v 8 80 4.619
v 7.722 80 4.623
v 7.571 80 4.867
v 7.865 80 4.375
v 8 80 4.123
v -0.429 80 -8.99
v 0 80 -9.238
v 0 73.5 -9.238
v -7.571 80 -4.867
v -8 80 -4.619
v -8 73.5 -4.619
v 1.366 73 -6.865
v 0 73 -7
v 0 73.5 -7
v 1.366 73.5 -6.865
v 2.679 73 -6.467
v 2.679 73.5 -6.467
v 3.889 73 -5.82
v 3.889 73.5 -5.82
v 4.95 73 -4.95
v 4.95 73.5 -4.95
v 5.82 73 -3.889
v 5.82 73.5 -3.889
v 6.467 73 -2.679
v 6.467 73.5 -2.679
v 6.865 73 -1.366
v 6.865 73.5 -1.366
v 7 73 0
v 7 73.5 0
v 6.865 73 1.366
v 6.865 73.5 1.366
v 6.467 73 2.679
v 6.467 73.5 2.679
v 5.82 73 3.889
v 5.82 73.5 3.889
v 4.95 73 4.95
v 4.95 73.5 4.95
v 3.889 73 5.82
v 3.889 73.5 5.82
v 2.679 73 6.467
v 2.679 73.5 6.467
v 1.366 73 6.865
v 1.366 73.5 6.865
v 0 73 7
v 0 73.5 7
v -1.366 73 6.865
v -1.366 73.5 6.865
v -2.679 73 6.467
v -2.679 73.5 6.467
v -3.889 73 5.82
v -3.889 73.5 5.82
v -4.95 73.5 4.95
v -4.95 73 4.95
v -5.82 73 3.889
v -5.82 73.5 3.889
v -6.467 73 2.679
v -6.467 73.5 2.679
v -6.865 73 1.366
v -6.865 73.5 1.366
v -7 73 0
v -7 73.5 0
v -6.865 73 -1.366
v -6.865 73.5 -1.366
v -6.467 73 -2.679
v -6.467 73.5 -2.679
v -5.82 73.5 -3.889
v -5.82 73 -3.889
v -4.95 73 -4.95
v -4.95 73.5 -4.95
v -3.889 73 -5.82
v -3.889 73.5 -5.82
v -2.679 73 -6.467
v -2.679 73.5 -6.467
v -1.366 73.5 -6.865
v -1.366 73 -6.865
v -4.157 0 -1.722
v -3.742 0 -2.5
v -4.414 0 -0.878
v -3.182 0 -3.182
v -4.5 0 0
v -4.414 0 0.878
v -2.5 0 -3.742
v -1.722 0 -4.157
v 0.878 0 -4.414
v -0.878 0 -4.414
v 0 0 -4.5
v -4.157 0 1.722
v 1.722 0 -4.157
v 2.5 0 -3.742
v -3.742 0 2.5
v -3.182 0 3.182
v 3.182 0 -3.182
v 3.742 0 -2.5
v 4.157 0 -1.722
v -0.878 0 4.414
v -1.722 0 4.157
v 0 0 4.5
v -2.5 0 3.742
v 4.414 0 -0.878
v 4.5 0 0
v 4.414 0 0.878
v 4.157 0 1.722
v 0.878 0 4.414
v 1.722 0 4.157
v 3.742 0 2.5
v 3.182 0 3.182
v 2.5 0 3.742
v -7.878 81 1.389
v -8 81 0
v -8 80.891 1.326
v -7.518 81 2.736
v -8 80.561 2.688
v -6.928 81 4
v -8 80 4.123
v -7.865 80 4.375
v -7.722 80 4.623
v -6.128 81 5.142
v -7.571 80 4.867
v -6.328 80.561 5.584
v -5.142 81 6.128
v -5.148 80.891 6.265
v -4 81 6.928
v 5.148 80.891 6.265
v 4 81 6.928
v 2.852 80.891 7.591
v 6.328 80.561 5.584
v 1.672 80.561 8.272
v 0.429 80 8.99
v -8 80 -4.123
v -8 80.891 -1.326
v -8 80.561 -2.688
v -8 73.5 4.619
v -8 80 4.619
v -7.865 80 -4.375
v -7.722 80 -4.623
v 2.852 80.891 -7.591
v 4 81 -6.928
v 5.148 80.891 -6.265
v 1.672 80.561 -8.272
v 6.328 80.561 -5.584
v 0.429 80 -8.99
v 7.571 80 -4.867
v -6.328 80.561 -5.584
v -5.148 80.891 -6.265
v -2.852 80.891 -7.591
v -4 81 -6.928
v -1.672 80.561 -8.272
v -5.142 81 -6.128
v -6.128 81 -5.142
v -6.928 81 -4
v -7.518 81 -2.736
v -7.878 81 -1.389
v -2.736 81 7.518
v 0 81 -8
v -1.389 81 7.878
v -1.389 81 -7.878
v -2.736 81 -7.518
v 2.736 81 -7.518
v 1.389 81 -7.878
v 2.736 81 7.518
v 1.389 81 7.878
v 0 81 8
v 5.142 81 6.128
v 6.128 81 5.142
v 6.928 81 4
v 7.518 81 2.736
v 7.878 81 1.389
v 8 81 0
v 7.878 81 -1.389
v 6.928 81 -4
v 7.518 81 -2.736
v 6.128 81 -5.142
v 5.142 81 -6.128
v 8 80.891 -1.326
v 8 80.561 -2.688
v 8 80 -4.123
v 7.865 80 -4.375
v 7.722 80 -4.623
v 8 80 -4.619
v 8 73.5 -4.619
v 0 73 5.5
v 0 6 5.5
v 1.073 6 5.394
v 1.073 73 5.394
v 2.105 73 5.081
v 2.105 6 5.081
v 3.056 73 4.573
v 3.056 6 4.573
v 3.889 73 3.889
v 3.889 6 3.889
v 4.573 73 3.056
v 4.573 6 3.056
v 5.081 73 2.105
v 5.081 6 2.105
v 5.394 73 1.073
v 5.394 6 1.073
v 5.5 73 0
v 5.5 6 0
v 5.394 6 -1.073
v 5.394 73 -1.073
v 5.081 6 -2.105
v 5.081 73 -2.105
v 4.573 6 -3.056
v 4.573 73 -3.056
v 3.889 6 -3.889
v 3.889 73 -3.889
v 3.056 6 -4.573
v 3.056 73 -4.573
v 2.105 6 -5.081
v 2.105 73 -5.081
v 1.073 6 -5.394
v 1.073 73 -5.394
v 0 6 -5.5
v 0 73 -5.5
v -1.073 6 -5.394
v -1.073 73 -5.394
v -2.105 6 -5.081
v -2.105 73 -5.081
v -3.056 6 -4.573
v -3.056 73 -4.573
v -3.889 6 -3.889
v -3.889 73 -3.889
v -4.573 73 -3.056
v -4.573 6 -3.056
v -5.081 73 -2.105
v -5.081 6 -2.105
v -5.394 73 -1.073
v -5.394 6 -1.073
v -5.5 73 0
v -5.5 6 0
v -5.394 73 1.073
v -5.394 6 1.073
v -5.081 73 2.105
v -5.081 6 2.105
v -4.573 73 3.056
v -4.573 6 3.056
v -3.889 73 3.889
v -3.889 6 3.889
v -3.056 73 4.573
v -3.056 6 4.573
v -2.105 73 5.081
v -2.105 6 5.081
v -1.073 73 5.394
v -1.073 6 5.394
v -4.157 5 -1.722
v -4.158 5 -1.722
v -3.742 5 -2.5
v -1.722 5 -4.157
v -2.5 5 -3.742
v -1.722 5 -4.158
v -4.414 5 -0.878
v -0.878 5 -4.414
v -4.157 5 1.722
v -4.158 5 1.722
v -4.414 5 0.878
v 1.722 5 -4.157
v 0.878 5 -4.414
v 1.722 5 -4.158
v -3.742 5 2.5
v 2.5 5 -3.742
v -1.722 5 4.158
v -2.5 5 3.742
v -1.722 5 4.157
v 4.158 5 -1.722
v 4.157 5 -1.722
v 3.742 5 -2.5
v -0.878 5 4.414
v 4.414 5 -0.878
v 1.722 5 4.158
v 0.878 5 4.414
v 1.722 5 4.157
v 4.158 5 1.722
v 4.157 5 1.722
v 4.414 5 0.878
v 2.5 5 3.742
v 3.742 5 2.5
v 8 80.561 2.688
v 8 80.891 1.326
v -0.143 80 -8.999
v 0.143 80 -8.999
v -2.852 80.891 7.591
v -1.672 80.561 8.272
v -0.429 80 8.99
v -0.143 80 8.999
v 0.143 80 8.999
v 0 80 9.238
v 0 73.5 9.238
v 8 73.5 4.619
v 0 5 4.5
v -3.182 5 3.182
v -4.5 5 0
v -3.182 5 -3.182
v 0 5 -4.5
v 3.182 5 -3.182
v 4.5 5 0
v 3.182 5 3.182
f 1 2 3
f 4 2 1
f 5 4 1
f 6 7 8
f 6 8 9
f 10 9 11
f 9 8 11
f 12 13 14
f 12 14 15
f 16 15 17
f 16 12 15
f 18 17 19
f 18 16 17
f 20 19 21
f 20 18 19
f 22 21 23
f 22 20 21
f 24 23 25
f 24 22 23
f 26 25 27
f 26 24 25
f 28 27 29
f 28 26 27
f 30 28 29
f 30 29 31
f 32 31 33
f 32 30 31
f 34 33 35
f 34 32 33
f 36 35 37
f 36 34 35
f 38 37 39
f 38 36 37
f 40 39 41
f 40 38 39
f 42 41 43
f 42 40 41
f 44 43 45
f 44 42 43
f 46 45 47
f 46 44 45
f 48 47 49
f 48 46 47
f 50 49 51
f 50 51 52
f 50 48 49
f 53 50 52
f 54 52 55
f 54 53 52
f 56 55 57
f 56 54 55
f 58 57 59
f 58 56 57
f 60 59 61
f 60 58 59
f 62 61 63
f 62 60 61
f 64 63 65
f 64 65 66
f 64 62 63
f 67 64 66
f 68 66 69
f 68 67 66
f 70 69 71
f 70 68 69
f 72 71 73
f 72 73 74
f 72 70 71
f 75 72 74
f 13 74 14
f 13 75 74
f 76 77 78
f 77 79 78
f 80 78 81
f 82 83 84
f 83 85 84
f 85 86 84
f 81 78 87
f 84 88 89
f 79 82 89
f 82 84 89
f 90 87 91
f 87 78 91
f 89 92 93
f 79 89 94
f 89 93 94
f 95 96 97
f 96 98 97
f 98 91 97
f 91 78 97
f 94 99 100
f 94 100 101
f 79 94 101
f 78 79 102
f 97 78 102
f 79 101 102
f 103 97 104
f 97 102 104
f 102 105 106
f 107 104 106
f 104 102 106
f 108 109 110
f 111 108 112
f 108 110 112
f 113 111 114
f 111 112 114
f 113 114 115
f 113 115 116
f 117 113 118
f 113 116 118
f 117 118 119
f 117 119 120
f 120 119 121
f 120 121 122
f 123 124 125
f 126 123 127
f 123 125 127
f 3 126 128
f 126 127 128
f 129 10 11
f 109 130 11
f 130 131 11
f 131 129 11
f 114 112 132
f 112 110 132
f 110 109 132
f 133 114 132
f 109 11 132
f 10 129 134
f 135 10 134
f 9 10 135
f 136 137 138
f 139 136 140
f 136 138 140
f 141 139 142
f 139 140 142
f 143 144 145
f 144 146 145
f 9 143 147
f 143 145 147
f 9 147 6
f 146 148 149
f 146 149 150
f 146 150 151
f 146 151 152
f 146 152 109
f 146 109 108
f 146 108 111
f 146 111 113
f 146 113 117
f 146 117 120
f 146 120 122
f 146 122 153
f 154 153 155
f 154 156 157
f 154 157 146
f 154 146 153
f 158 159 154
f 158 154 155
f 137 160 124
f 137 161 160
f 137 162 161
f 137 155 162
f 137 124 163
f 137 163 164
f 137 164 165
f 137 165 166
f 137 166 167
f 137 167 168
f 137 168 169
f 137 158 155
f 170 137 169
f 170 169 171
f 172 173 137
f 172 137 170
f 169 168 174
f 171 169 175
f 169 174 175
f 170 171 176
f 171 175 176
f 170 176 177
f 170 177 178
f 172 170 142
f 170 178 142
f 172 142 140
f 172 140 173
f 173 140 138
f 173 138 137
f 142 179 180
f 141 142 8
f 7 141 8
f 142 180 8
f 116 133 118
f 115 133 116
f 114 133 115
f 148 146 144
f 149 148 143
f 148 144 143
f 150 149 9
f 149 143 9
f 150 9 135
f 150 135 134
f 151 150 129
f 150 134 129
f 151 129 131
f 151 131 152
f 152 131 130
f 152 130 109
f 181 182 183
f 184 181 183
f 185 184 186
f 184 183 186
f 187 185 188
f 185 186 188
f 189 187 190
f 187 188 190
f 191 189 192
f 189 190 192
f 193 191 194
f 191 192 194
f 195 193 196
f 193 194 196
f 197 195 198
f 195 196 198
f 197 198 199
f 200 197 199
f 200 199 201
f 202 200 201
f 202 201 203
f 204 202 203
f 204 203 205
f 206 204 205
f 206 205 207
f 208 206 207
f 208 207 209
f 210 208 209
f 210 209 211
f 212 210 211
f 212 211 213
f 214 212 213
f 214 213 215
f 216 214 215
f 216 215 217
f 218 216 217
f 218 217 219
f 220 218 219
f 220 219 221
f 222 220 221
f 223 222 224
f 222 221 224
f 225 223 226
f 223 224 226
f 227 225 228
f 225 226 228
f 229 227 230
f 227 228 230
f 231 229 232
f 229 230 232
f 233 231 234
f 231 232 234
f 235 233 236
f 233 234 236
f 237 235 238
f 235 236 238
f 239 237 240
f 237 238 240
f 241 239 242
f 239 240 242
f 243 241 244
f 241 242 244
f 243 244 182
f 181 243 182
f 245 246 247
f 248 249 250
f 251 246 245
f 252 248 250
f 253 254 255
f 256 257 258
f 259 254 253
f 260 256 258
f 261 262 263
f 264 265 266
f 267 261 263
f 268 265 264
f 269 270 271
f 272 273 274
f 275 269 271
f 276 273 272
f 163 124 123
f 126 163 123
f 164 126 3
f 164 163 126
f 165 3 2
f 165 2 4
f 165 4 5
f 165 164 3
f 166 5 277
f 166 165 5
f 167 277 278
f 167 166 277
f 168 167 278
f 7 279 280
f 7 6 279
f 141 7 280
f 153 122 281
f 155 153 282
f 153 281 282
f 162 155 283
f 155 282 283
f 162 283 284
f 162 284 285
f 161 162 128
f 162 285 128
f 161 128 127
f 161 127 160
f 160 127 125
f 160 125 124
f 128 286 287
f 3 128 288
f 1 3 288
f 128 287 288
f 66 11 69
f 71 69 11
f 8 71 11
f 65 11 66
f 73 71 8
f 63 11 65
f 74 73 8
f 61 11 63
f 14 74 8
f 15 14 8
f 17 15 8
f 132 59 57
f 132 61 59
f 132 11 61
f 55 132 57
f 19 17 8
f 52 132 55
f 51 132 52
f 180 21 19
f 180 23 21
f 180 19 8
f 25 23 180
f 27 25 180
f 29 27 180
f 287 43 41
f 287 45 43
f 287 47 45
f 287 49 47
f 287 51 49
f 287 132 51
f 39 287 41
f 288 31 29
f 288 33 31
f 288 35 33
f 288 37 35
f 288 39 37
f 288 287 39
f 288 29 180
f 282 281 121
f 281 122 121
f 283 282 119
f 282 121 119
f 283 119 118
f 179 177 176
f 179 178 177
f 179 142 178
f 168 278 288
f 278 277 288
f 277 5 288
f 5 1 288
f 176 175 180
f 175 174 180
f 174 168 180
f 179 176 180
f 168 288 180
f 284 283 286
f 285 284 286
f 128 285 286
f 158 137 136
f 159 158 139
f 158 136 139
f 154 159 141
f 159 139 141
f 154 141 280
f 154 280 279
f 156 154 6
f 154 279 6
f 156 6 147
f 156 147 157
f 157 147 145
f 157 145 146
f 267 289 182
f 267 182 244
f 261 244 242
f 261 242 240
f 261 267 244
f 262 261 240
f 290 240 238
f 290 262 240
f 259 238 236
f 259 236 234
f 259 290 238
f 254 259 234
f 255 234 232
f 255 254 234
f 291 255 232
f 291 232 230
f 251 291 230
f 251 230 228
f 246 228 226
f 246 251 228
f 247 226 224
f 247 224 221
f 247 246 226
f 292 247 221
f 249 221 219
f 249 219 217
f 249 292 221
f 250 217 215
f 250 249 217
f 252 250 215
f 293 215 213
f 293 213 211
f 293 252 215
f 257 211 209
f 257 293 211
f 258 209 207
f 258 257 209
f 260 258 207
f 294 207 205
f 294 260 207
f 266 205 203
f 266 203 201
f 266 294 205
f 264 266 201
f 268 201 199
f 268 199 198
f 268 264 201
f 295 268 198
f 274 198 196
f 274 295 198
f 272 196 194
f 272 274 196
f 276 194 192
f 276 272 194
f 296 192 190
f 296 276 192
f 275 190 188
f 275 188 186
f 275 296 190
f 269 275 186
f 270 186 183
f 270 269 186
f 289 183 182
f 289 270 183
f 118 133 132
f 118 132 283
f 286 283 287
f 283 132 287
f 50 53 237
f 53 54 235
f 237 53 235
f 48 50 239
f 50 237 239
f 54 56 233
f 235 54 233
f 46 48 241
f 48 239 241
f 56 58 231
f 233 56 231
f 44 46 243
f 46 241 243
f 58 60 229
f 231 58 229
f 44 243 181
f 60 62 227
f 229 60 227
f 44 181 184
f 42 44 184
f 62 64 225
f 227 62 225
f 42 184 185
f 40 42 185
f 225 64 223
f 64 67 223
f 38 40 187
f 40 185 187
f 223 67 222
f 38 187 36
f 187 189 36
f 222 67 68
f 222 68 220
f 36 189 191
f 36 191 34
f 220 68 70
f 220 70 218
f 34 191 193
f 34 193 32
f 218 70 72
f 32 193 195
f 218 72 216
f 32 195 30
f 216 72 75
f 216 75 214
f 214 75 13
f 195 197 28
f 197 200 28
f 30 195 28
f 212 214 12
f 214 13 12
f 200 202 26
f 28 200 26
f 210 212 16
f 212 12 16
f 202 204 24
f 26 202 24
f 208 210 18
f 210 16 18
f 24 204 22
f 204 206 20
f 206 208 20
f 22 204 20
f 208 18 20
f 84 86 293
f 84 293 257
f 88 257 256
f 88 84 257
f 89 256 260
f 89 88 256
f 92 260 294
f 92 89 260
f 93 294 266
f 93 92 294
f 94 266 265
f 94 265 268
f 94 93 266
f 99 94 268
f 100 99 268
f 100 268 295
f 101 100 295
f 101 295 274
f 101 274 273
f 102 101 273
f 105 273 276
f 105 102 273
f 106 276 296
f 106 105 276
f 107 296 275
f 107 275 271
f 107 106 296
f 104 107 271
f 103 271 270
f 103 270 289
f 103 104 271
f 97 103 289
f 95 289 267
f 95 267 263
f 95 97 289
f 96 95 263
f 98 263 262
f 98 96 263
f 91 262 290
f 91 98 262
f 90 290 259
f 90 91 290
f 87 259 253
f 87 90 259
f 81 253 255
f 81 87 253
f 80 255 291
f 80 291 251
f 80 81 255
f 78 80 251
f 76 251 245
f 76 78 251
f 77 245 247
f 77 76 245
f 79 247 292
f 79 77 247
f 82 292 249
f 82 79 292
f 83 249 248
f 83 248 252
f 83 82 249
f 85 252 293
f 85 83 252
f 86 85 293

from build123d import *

# Parameters (mm, degrees)
SKETCH1_R      = 5.5
EXTRUDE1_DEPTH = 73
EXTRUDE2_DEPTH = 8
SKETCH3_R      = 14.116748978
SKETCH3_R_2    = 7
EXTRUDE3_DEPTH = 0.5
SKETCH4_R      = 19.693652211
SKETCH4_R_2    = 4.5
EXTRUDE4_DEPTH = 5
CHAMFER1_SIZE  = 1
SKETCH5_R      = 25.58893004
SKETCH5_R_2    = 8
EXTRUDE5_DEPTH = 1
CHAMFER2_SIZE  = 1


# Some blends are built 0.0001 mm under size
with BuildPart() as part:
    # Sketch1 → Extrude1 (new body)
    with BuildSketch(Plane(origin=(0, 0, 0), x_dir=(1, 0, 0), z_dir=(0, 1, 0))):
        with Locations(Location((0, 0, 0), (0, 0, 270))):
            Circle(SKETCH1_R)
    extrude(amount=EXTRUDE1_DEPTH)

    # Sketch2 → Extrude2 (add)
    with BuildSketch(Plane(origin=(0, 73, 0), x_dir=(1, 0, 0), z_dir=(0, 1, 0))):
        Polygon((8, -4.618802154), (8, 4.618802154), (0, 9.237604307), (-8, 4.618802154), (-8, -4.618802154), (0, -9.237604307), align=None)
    extrude(amount=EXTRUDE2_DEPTH)

    # Sketch3 → Extrude3 (cut)
    with BuildSketch(Plane.XZ.offset(-73)):
        Circle(SKETCH3_R)
        with Locations(Location((0, 0, 0), (0, 0, 270))):
            Circle(SKETCH3_R_2, mode=Mode.SUBTRACT)
    extrude(amount=-EXTRUDE3_DEPTH, mode=Mode.SUBTRACT)

    # Sketch4 → Extrude4 (cut)
    with BuildSketch(Plane.XZ):
        Circle(SKETCH4_R)
        with Locations(Location((0, 0, 0), (0, 0, 270))):
            Circle(SKETCH4_R_2, mode=Mode.SUBTRACT)
    extrude(amount=-EXTRUDE4_DEPTH, mode=Mode.SUBTRACT)

    # Chamfer1
    chamfer1_edges = [part.edges().sort_by_distance(p)[0] for p in [
        (0, 5, -5.5),
    ]]
    chamfer(chamfer1_edges, length=CHAMFER1_SIZE - 0.0001)  # a hair under: the kernel refuses the full size

    # Sketch5 → Extrude5 (cut)
    with BuildSketch(Plane(origin=(0, 81, 0), x_dir=(1, 0, 0), z_dir=(0, 1, 0))):
        Circle(SKETCH5_R)
        with Locations(Location((0, 0, 0), (0, 0, 270))):
            Circle(SKETCH5_R_2, mode=Mode.SUBTRACT)
    extrude(amount=-EXTRUDE5_DEPTH, mode=Mode.SUBTRACT)

    # Chamfer2
    # the kernel refuses this chamfer: 1 mm, written as the material it adds along each edge
    with BuildSketch(Plane(origin=(0, 80, 0), x_dir=(0.5000000000000043, 0, -0.8660254037844362), z_dir=(0.8660254037844362, 0, 0.5000000000000043))) as chamfer2_piece_1_section:
        Polygon((8, CHAMFER2_SIZE), (8 + CHAMFER2_SIZE, 0), (8, 0), align=None)
    chamfer2_piece_1 = revolve(axis=Axis((0, 80, 0), (0, 1, 0)), revolution_arc=60, mode=Mode.PRIVATE)
    chamfer2_piece_1 = split(chamfer2_piece_1, bisect_by=Plane(origin=(-0.488712857, 80.376891688, -8.955445807), z_dir=(0.49999999999999606, 0, 0.8660254037844412)), keep=Keep.TOP, mode=Mode.PRIVATE)
    chamfer2_piece_1 = split(chamfer2_piece_1, bisect_by=Plane(origin=(0.488712857, 80.376891688, -8.955445807), z_dir=(-0.500000000000004, 0, 0.8660254037844364)), keep=Keep.TOP, mode=Mode.PRIVATE)
    add(chamfer2_piece_1)
    with BuildSketch(Plane(origin=(0, 80, 0), x_dir=(-0.4999999999999957, 0, -0.8660254037844412), z_dir=(0.8660254037844412, 0, -0.4999999999999957))) as chamfer2_piece_2_section:
        Polygon((8, CHAMFER2_SIZE), (8 + CHAMFER2_SIZE, 0), (8, 0), align=None)
    chamfer2_piece_2 = revolve(axis=Axis((0, 80, 0), (0, 1, 0)), revolution_arc=60, mode=Mode.PRIVATE)
    chamfer2_piece_2 = split(chamfer2_piece_2, bisect_by=Plane(origin=(-8, 80.376891688, -4.054485154), z_dir=(1, 0, 0)), keep=Keep.TOP, mode=Mode.PRIVATE)
    chamfer2_piece_2 = split(chamfer2_piece_2, bisect_by=Plane(origin=(-7.511287143, 80.376891688, -4.900960653), z_dir=(0.49999999999999606, 0, 0.8660254037844412)), keep=Keep.TOP, mode=Mode.PRIVATE)
    add(chamfer2_piece_2)
    with BuildSketch(Plane(origin=(0, 80, 0), x_dir=(-1, 0, 0), z_dir=(0, 0, -1))) as chamfer2_piece_3_section:
        Polygon((8, CHAMFER2_SIZE), (8 + CHAMFER2_SIZE, 0), (8, 0), align=None)
    chamfer2_piece_3 = revolve(axis=Axis((0, 80, 0), (0, 1, 0)), revolution_arc=60, mode=Mode.PRIVATE)
    chamfer2_piece_3 = split(chamfer2_piece_3, bisect_by=Plane(origin=(-7.511287143, 80.376891688, 4.900960653), z_dir=(0.5000000000000039, 0, -0.8660254037844365)), keep=Keep.TOP, mode=Mode.PRIVATE)
    chamfer2_piece_3 = split(chamfer2_piece_3, bisect_by=Plane(origin=(-8, 80.376891688, 4.054485154), z_dir=(1, 0, 0)), keep=Keep.TOP, mode=Mode.PRIVATE)
    add(chamfer2_piece_3)
    with BuildSketch(Plane(origin=(0, 80, 0), x_dir=(1, 0, 0), z_dir=(0, 0, 1))) as chamfer2_piece_4_section:
        Polygon((8, CHAMFER2_SIZE), (8 + CHAMFER2_SIZE, 0), (8, 0), align=None)
    chamfer2_piece_4 = revolve(axis=Axis((0, 80, 0), (0, 1, 0)), revolution_arc=60, mode=Mode.PRIVATE)
    chamfer2_piece_4 = split(chamfer2_piece_4, bisect_by=Plane(origin=(8, 80.376891688, -4.054485154), z_dir=(-1, 0, 0)), keep=Keep.TOP, mode=Mode.PRIVATE)
    chamfer2_piece_4 = split(chamfer2_piece_4, bisect_by=Plane(origin=(7.511287143, 80.376891688, -4.900960653), z_dir=(-0.500000000000004, 0, 0.8660254037844364)), keep=Keep.TOP, mode=Mode.PRIVATE)
    add(chamfer2_piece_4)
    with BuildSketch(Plane(origin=(0, 80, 0), x_dir=(-0.5000000000000046, 0, 0.8660254037844362), z_dir=(-0.8660254037844362, 0, -0.5000000000000046))) as chamfer2_piece_5_section:
        Polygon((8, CHAMFER2_SIZE), (8 + CHAMFER2_SIZE, 0), (8, 0), align=None)
    chamfer2_piece_5 = revolve(axis=Axis((0, 80, 0), (0, 1, 0)), revolution_arc=30, mode=Mode.PRIVATE)
    chamfer2_piece_5 = split(chamfer2_piece_5, bisect_by=Plane(origin=(-1.40811023, 80.376891688, 8.424631487), z_dir=(0.5000000000000039, 0, -0.8660254037844365)), keep=Keep.TOP, mode=Mode.PRIVATE)
    add(chamfer2_piece_5)
    with BuildSketch(Plane(origin=(0, 80, 0), x_dir=(0.4999999999999962, 0, 0.8660254037844408), z_dir=(-0.8660254037844408, 0, 0.4999999999999962))) as chamfer2_piece_6_section:
        Polygon((8 + CHAMFER2_SIZE, 0), (8, CHAMFER2_SIZE), (8, 0), align=None)
    chamfer2_piece_6 = revolve(axis=Axis((0, 80, 0), (0, 1, 0)), revolution_arc=60, mode=Mode.PRIVATE)
    chamfer2_piece_6 = split(chamfer2_piece_6, bisect_by=Plane(origin=(8, 80.376891688, 4.054485154), z_dir=(-1, 0, 0)), keep=Keep.TOP, mode=Mode.PRIVATE)
    chamfer2_piece_6 = split(chamfer2_piece_6, bisect_by=Plane(origin=(7.511287143, 80.376891688, 4.900960653), z_dir=(-0.4999999999999963, 0, -0.866025403784441)), keep=Keep.TOP, mode=Mode.PRIVATE)
    add(chamfer2_piece_6)
    with BuildSketch(Plane(origin=(0, 80, 0), x_dir=(0, 0, 1), z_dir=(-1, 0, 0))) as chamfer2_piece_7_section:
        Polygon((8, CHAMFER2_SIZE), (8 + CHAMFER2_SIZE, 0), (8, 0), align=None)
    chamfer2_piece_7 = revolve(axis=Axis((0, 80, 0), (0, 1, 0)), revolution_arc=30, mode=Mode.PRIVATE)
    chamfer2_piece_7 = split(chamfer2_piece_7, bisect_by=Plane(origin=(1.40811023, 80.376891688, 8.424631487), z_dir=(-0.4999999999999963, 0, -0.866025403784441)), keep=Keep.TOP, mode=Mode.PRIVATE)
    add(chamfer2_piece_7)


solid = part.part
